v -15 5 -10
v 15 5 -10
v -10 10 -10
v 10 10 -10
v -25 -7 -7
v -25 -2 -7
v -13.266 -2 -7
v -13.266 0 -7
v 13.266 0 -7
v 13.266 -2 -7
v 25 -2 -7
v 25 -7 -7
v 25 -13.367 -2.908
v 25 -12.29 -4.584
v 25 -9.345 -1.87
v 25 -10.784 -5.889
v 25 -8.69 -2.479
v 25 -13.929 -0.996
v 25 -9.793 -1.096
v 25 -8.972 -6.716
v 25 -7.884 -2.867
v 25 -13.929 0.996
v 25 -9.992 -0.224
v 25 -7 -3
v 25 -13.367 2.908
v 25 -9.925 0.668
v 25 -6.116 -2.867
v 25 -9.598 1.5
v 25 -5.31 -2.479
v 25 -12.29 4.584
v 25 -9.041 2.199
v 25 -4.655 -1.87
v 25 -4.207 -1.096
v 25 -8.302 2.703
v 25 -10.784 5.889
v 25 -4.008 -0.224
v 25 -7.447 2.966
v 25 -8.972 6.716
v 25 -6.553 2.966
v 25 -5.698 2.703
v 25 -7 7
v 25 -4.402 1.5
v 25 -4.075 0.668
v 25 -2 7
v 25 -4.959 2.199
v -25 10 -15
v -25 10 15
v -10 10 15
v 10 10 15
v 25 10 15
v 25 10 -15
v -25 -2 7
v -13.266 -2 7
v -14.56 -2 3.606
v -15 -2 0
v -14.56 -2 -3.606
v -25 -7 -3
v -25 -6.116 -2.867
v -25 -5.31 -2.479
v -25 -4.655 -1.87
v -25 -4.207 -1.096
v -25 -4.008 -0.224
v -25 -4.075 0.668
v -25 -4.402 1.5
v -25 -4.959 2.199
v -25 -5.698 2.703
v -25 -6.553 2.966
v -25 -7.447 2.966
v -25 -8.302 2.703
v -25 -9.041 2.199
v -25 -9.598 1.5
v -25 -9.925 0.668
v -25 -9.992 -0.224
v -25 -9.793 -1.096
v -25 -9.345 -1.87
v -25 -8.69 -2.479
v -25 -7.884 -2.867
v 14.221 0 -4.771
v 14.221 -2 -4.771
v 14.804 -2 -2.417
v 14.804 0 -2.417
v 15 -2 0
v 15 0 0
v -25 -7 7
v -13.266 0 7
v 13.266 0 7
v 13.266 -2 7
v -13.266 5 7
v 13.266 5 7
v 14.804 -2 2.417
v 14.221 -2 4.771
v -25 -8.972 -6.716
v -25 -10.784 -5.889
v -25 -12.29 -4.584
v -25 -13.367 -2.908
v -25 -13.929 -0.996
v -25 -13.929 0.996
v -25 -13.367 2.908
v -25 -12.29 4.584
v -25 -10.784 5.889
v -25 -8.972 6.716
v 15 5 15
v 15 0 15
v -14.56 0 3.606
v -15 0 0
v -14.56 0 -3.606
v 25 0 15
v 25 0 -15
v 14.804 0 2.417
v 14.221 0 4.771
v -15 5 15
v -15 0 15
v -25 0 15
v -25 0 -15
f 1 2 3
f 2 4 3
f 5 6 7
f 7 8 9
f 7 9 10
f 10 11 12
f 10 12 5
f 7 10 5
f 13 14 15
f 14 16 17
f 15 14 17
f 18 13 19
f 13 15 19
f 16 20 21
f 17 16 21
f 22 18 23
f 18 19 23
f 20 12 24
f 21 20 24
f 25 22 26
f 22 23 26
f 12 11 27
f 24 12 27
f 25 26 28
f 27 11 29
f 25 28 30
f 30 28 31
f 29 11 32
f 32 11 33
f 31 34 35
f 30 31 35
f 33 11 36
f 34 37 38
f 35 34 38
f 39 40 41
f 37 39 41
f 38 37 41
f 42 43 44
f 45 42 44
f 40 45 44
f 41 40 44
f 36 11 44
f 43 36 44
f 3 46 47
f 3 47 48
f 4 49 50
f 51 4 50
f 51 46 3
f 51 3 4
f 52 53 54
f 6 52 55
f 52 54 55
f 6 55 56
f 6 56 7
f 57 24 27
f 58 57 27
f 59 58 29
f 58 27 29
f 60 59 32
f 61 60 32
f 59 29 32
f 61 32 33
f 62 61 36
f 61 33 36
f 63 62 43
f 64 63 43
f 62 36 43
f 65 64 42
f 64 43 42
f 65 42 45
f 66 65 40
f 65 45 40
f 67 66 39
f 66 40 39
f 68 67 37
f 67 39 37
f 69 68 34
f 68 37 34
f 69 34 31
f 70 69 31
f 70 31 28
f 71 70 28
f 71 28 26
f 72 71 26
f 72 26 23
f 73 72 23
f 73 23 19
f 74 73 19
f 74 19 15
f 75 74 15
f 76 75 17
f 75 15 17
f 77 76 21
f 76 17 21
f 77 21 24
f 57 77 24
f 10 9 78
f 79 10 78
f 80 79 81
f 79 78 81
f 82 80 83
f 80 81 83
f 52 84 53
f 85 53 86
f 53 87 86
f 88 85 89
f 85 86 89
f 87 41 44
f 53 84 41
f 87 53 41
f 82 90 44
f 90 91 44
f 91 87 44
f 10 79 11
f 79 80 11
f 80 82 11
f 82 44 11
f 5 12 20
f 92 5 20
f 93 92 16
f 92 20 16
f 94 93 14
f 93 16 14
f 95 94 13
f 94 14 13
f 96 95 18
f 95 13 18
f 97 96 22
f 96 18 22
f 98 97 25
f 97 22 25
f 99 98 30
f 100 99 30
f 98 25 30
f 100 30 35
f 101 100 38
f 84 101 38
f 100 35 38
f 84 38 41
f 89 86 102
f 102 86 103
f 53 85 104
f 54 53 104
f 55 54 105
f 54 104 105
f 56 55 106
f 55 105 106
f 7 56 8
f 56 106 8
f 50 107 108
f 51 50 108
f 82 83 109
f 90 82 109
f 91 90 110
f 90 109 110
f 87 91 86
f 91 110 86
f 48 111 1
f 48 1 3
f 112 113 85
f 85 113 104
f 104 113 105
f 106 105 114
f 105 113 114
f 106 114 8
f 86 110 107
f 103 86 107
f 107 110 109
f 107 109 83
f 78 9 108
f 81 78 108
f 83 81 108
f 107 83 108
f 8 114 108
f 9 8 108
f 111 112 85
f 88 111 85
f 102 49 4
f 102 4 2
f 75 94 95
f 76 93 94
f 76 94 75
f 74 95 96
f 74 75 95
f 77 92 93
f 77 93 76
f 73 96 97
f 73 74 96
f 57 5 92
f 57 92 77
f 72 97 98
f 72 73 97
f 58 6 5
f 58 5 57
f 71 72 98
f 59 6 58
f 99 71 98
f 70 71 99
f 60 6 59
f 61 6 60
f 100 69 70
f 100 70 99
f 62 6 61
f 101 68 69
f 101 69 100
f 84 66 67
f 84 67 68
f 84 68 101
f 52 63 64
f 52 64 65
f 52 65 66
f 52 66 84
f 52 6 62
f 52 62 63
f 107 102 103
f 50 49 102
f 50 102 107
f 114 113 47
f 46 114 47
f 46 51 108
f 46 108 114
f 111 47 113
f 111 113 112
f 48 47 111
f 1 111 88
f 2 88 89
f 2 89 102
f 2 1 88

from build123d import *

# Parameters (mm, degrees)
BOSS_EXTRUDE1_DEPTH = 5
BOSS_EXTRUDE2_DEPTH = 2
BOSS_EXTRUDE7_DEPTH = 30
SKETCH11_R          = 3
BOSS_EXTRUDE8_DEPTH = 50
BOSS_EXTRUDE9_DEPTH = 5


with BuildPart() as part:
    # Sketch1 → Boss-Extrude1 (new body)
    with BuildSketch(Plane(origin=(0, 0, 0), x_dir=(1, 0, 0), z_dir=(0, 1, 0))):
        Polygon((-25, 15), (-25, -15), (-15, -15), (-13.266499161, -7), (13.266499161, -7), (15, -15), (25, -15), (25, 15), align=None)
    extrude(amount=BOSS_EXTRUDE1_DEPTH)

    # Sketch4 → Boss-Extrude2 (add)
    with BuildSketch(Plane.XZ):
        with BuildLine():
            Line((13.266499161, 7), (-13.266499161, 7))
            ThreePointArc((-13.266499161, 7), (-15, 0), (-13.266499161, -7))
            Line((-13.266499161, -7), (13.266499161, -7))
            ThreePointArc((13.266499161, -7), (14.560176637, -3.605725487), (15, 0))
            ThreePointArc((15, 0), (14.560176637, 3.605725487), (13.266499161, 7))
        make_face()
    extrude(amount=BOSS_EXTRUDE2_DEPTH)

    # Sketch10 → Boss-Extrude7 (add)
    with BuildSketch(Plane.XY.offset(15)):
        Polygon((-10, 10), (-25, 10), (-25, 5), (-15, 5), align=None)
        Polygon((10, 10), (15, 5), (25, 5), (25, 10), align=None)
    extrude(amount=-BOSS_EXTRUDE7_DEPTH)

    # Sketch11 → Boss-Extrude8 (add)
    with BuildSketch(Plane(origin=(25, 0, 0), x_dir=(0, 0, -1), z_dir=(1, 0, 0))):
        with BuildLine():
            Line((-7, -7), (-7, -2))
            Line((-7, -2), (7, -2))
            Line((7, -2), (7, -7))
            ThreePointArc((7, -7), (0, -14), (-7, -7))
        make_face()
        with Locations((0, -7)):
            Circle(SKETCH11_R, mode=Mode.SUBTRACT)
    extrude(amount=-BOSS_EXTRUDE8_DEPTH)

    # Sketch12 → Boss-Extrude9 (add)
    with BuildSketch(Plane(origin=(0, 0, -15), x_dir=(-1, 0, 0), z_dir=(0, 0, -1))):
        Polygon((-15, 5), (15, 5), (10, 10), (-10, 10), align=None)
    extrude(amount=-BOSS_EXTRUDE9_DEPTH)


solid = part.part
